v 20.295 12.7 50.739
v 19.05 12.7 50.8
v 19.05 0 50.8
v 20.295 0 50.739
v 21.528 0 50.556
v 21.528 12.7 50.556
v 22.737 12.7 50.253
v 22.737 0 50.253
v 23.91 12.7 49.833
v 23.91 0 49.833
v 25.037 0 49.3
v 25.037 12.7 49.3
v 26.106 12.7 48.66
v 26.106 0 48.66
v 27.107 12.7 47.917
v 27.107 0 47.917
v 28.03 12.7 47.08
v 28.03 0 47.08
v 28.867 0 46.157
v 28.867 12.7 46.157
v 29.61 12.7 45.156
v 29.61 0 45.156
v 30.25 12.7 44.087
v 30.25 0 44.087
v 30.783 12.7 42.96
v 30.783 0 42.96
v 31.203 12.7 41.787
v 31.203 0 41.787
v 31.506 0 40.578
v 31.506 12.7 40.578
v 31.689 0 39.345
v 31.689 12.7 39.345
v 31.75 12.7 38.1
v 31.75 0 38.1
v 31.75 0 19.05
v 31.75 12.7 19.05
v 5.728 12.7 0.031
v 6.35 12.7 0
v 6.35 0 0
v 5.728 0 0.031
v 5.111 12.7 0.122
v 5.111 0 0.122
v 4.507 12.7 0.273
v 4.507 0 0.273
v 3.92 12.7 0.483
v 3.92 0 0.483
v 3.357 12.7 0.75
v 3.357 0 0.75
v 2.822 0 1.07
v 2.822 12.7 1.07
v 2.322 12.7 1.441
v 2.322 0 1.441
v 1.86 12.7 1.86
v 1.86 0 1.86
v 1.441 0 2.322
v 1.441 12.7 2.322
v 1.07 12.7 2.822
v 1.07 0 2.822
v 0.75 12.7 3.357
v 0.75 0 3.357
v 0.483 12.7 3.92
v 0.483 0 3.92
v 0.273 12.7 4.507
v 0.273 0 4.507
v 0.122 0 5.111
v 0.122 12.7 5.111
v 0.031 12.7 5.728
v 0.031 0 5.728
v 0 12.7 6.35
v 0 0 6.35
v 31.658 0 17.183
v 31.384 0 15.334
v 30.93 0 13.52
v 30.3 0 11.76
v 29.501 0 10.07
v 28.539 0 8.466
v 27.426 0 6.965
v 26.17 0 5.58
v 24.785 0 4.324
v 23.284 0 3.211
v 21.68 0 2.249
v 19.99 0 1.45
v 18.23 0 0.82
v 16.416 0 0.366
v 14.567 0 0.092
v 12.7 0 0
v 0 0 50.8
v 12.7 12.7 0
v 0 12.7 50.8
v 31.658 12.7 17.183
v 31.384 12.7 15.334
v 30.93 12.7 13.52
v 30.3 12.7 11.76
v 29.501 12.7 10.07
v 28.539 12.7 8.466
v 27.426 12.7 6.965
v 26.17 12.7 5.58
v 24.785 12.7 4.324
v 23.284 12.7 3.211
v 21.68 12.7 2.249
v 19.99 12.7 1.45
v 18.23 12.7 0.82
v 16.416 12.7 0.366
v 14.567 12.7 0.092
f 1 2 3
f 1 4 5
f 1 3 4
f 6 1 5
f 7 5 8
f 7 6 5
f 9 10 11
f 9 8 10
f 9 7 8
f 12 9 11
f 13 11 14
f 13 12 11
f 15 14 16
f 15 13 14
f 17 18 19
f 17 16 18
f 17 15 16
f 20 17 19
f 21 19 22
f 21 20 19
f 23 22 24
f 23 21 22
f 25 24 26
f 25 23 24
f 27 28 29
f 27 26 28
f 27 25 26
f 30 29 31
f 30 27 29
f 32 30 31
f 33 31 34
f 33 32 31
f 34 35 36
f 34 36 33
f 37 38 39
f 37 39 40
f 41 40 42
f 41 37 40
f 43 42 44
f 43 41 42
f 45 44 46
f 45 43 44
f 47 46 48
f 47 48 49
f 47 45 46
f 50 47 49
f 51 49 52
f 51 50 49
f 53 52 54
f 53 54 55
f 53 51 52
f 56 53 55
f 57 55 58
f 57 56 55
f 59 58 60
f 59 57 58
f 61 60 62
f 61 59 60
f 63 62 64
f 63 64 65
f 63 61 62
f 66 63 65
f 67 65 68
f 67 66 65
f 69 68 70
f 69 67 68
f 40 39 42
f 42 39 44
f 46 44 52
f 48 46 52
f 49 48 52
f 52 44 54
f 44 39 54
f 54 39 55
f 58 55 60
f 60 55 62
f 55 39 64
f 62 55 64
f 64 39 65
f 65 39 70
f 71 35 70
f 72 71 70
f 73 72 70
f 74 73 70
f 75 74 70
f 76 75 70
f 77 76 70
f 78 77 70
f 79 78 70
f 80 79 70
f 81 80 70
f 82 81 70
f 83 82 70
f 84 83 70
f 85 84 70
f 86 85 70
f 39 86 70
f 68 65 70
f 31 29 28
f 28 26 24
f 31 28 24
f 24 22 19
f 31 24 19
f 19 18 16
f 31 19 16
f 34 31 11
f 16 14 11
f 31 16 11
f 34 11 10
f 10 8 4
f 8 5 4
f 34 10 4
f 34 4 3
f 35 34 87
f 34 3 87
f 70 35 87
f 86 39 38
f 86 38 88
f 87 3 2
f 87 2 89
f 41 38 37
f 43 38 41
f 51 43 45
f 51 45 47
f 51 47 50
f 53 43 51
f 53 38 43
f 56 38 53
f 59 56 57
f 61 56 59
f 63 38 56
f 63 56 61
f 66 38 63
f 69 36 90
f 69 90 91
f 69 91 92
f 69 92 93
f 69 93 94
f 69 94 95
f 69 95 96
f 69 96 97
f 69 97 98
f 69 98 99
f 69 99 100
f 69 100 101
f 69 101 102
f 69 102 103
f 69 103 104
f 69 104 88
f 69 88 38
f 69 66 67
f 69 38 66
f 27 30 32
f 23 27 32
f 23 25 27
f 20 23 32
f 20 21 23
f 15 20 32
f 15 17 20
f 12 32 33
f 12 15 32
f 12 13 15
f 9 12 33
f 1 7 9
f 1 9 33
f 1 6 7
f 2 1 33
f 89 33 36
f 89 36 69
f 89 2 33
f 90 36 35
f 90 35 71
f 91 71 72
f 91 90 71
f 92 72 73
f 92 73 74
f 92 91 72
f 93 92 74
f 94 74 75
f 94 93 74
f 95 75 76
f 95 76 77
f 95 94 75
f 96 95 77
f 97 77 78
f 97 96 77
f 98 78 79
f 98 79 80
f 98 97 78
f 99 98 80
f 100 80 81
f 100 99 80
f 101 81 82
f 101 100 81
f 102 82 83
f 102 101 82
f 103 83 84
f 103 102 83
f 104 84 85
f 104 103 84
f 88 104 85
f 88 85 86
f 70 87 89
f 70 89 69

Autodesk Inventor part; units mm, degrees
ref_plane "YZ Plane" through (0, 0, 0) normal (1, 0, 0) x (0, 1, 0)
ref_plane "XZ Plane" through (0, 0, 0) normal (0, 1, 0) x (-1, 0, 0)
ref_plane "XY Plane" through (0, 0, 0) normal (0, 0, 1) x (1, 0, 0)
sketch "Sketch1" plane through (0, 0, 0) normal (0, 1, 0) x (-1, 0, 0)
  line L0 (0, 0) -> (-31.75, 0)
  line L1 (-31.75, 0) -> (-31.75, 50.8)
  line L2 (-31.75, 50.8) -> (0, 50.8)
  line L3 (0, 50.8) -> (0, 0)
  dimension "d0" = 31.75
  dimension "d1" = 50.8
extrude "Extrusion1" add sketch "Sketch1" along normal blind 12.7
fillet "Fillet1" radius 6.35 1 edges at (0, 6.35, 0)
fillet "Fillet2" radius 12.7 1 edges at (31.75, 6.35, 50.8)
fillet "Fillet3" radius 19.05 1 edges at (31.75, 6.35, 0)
properties part number "Practice1"
